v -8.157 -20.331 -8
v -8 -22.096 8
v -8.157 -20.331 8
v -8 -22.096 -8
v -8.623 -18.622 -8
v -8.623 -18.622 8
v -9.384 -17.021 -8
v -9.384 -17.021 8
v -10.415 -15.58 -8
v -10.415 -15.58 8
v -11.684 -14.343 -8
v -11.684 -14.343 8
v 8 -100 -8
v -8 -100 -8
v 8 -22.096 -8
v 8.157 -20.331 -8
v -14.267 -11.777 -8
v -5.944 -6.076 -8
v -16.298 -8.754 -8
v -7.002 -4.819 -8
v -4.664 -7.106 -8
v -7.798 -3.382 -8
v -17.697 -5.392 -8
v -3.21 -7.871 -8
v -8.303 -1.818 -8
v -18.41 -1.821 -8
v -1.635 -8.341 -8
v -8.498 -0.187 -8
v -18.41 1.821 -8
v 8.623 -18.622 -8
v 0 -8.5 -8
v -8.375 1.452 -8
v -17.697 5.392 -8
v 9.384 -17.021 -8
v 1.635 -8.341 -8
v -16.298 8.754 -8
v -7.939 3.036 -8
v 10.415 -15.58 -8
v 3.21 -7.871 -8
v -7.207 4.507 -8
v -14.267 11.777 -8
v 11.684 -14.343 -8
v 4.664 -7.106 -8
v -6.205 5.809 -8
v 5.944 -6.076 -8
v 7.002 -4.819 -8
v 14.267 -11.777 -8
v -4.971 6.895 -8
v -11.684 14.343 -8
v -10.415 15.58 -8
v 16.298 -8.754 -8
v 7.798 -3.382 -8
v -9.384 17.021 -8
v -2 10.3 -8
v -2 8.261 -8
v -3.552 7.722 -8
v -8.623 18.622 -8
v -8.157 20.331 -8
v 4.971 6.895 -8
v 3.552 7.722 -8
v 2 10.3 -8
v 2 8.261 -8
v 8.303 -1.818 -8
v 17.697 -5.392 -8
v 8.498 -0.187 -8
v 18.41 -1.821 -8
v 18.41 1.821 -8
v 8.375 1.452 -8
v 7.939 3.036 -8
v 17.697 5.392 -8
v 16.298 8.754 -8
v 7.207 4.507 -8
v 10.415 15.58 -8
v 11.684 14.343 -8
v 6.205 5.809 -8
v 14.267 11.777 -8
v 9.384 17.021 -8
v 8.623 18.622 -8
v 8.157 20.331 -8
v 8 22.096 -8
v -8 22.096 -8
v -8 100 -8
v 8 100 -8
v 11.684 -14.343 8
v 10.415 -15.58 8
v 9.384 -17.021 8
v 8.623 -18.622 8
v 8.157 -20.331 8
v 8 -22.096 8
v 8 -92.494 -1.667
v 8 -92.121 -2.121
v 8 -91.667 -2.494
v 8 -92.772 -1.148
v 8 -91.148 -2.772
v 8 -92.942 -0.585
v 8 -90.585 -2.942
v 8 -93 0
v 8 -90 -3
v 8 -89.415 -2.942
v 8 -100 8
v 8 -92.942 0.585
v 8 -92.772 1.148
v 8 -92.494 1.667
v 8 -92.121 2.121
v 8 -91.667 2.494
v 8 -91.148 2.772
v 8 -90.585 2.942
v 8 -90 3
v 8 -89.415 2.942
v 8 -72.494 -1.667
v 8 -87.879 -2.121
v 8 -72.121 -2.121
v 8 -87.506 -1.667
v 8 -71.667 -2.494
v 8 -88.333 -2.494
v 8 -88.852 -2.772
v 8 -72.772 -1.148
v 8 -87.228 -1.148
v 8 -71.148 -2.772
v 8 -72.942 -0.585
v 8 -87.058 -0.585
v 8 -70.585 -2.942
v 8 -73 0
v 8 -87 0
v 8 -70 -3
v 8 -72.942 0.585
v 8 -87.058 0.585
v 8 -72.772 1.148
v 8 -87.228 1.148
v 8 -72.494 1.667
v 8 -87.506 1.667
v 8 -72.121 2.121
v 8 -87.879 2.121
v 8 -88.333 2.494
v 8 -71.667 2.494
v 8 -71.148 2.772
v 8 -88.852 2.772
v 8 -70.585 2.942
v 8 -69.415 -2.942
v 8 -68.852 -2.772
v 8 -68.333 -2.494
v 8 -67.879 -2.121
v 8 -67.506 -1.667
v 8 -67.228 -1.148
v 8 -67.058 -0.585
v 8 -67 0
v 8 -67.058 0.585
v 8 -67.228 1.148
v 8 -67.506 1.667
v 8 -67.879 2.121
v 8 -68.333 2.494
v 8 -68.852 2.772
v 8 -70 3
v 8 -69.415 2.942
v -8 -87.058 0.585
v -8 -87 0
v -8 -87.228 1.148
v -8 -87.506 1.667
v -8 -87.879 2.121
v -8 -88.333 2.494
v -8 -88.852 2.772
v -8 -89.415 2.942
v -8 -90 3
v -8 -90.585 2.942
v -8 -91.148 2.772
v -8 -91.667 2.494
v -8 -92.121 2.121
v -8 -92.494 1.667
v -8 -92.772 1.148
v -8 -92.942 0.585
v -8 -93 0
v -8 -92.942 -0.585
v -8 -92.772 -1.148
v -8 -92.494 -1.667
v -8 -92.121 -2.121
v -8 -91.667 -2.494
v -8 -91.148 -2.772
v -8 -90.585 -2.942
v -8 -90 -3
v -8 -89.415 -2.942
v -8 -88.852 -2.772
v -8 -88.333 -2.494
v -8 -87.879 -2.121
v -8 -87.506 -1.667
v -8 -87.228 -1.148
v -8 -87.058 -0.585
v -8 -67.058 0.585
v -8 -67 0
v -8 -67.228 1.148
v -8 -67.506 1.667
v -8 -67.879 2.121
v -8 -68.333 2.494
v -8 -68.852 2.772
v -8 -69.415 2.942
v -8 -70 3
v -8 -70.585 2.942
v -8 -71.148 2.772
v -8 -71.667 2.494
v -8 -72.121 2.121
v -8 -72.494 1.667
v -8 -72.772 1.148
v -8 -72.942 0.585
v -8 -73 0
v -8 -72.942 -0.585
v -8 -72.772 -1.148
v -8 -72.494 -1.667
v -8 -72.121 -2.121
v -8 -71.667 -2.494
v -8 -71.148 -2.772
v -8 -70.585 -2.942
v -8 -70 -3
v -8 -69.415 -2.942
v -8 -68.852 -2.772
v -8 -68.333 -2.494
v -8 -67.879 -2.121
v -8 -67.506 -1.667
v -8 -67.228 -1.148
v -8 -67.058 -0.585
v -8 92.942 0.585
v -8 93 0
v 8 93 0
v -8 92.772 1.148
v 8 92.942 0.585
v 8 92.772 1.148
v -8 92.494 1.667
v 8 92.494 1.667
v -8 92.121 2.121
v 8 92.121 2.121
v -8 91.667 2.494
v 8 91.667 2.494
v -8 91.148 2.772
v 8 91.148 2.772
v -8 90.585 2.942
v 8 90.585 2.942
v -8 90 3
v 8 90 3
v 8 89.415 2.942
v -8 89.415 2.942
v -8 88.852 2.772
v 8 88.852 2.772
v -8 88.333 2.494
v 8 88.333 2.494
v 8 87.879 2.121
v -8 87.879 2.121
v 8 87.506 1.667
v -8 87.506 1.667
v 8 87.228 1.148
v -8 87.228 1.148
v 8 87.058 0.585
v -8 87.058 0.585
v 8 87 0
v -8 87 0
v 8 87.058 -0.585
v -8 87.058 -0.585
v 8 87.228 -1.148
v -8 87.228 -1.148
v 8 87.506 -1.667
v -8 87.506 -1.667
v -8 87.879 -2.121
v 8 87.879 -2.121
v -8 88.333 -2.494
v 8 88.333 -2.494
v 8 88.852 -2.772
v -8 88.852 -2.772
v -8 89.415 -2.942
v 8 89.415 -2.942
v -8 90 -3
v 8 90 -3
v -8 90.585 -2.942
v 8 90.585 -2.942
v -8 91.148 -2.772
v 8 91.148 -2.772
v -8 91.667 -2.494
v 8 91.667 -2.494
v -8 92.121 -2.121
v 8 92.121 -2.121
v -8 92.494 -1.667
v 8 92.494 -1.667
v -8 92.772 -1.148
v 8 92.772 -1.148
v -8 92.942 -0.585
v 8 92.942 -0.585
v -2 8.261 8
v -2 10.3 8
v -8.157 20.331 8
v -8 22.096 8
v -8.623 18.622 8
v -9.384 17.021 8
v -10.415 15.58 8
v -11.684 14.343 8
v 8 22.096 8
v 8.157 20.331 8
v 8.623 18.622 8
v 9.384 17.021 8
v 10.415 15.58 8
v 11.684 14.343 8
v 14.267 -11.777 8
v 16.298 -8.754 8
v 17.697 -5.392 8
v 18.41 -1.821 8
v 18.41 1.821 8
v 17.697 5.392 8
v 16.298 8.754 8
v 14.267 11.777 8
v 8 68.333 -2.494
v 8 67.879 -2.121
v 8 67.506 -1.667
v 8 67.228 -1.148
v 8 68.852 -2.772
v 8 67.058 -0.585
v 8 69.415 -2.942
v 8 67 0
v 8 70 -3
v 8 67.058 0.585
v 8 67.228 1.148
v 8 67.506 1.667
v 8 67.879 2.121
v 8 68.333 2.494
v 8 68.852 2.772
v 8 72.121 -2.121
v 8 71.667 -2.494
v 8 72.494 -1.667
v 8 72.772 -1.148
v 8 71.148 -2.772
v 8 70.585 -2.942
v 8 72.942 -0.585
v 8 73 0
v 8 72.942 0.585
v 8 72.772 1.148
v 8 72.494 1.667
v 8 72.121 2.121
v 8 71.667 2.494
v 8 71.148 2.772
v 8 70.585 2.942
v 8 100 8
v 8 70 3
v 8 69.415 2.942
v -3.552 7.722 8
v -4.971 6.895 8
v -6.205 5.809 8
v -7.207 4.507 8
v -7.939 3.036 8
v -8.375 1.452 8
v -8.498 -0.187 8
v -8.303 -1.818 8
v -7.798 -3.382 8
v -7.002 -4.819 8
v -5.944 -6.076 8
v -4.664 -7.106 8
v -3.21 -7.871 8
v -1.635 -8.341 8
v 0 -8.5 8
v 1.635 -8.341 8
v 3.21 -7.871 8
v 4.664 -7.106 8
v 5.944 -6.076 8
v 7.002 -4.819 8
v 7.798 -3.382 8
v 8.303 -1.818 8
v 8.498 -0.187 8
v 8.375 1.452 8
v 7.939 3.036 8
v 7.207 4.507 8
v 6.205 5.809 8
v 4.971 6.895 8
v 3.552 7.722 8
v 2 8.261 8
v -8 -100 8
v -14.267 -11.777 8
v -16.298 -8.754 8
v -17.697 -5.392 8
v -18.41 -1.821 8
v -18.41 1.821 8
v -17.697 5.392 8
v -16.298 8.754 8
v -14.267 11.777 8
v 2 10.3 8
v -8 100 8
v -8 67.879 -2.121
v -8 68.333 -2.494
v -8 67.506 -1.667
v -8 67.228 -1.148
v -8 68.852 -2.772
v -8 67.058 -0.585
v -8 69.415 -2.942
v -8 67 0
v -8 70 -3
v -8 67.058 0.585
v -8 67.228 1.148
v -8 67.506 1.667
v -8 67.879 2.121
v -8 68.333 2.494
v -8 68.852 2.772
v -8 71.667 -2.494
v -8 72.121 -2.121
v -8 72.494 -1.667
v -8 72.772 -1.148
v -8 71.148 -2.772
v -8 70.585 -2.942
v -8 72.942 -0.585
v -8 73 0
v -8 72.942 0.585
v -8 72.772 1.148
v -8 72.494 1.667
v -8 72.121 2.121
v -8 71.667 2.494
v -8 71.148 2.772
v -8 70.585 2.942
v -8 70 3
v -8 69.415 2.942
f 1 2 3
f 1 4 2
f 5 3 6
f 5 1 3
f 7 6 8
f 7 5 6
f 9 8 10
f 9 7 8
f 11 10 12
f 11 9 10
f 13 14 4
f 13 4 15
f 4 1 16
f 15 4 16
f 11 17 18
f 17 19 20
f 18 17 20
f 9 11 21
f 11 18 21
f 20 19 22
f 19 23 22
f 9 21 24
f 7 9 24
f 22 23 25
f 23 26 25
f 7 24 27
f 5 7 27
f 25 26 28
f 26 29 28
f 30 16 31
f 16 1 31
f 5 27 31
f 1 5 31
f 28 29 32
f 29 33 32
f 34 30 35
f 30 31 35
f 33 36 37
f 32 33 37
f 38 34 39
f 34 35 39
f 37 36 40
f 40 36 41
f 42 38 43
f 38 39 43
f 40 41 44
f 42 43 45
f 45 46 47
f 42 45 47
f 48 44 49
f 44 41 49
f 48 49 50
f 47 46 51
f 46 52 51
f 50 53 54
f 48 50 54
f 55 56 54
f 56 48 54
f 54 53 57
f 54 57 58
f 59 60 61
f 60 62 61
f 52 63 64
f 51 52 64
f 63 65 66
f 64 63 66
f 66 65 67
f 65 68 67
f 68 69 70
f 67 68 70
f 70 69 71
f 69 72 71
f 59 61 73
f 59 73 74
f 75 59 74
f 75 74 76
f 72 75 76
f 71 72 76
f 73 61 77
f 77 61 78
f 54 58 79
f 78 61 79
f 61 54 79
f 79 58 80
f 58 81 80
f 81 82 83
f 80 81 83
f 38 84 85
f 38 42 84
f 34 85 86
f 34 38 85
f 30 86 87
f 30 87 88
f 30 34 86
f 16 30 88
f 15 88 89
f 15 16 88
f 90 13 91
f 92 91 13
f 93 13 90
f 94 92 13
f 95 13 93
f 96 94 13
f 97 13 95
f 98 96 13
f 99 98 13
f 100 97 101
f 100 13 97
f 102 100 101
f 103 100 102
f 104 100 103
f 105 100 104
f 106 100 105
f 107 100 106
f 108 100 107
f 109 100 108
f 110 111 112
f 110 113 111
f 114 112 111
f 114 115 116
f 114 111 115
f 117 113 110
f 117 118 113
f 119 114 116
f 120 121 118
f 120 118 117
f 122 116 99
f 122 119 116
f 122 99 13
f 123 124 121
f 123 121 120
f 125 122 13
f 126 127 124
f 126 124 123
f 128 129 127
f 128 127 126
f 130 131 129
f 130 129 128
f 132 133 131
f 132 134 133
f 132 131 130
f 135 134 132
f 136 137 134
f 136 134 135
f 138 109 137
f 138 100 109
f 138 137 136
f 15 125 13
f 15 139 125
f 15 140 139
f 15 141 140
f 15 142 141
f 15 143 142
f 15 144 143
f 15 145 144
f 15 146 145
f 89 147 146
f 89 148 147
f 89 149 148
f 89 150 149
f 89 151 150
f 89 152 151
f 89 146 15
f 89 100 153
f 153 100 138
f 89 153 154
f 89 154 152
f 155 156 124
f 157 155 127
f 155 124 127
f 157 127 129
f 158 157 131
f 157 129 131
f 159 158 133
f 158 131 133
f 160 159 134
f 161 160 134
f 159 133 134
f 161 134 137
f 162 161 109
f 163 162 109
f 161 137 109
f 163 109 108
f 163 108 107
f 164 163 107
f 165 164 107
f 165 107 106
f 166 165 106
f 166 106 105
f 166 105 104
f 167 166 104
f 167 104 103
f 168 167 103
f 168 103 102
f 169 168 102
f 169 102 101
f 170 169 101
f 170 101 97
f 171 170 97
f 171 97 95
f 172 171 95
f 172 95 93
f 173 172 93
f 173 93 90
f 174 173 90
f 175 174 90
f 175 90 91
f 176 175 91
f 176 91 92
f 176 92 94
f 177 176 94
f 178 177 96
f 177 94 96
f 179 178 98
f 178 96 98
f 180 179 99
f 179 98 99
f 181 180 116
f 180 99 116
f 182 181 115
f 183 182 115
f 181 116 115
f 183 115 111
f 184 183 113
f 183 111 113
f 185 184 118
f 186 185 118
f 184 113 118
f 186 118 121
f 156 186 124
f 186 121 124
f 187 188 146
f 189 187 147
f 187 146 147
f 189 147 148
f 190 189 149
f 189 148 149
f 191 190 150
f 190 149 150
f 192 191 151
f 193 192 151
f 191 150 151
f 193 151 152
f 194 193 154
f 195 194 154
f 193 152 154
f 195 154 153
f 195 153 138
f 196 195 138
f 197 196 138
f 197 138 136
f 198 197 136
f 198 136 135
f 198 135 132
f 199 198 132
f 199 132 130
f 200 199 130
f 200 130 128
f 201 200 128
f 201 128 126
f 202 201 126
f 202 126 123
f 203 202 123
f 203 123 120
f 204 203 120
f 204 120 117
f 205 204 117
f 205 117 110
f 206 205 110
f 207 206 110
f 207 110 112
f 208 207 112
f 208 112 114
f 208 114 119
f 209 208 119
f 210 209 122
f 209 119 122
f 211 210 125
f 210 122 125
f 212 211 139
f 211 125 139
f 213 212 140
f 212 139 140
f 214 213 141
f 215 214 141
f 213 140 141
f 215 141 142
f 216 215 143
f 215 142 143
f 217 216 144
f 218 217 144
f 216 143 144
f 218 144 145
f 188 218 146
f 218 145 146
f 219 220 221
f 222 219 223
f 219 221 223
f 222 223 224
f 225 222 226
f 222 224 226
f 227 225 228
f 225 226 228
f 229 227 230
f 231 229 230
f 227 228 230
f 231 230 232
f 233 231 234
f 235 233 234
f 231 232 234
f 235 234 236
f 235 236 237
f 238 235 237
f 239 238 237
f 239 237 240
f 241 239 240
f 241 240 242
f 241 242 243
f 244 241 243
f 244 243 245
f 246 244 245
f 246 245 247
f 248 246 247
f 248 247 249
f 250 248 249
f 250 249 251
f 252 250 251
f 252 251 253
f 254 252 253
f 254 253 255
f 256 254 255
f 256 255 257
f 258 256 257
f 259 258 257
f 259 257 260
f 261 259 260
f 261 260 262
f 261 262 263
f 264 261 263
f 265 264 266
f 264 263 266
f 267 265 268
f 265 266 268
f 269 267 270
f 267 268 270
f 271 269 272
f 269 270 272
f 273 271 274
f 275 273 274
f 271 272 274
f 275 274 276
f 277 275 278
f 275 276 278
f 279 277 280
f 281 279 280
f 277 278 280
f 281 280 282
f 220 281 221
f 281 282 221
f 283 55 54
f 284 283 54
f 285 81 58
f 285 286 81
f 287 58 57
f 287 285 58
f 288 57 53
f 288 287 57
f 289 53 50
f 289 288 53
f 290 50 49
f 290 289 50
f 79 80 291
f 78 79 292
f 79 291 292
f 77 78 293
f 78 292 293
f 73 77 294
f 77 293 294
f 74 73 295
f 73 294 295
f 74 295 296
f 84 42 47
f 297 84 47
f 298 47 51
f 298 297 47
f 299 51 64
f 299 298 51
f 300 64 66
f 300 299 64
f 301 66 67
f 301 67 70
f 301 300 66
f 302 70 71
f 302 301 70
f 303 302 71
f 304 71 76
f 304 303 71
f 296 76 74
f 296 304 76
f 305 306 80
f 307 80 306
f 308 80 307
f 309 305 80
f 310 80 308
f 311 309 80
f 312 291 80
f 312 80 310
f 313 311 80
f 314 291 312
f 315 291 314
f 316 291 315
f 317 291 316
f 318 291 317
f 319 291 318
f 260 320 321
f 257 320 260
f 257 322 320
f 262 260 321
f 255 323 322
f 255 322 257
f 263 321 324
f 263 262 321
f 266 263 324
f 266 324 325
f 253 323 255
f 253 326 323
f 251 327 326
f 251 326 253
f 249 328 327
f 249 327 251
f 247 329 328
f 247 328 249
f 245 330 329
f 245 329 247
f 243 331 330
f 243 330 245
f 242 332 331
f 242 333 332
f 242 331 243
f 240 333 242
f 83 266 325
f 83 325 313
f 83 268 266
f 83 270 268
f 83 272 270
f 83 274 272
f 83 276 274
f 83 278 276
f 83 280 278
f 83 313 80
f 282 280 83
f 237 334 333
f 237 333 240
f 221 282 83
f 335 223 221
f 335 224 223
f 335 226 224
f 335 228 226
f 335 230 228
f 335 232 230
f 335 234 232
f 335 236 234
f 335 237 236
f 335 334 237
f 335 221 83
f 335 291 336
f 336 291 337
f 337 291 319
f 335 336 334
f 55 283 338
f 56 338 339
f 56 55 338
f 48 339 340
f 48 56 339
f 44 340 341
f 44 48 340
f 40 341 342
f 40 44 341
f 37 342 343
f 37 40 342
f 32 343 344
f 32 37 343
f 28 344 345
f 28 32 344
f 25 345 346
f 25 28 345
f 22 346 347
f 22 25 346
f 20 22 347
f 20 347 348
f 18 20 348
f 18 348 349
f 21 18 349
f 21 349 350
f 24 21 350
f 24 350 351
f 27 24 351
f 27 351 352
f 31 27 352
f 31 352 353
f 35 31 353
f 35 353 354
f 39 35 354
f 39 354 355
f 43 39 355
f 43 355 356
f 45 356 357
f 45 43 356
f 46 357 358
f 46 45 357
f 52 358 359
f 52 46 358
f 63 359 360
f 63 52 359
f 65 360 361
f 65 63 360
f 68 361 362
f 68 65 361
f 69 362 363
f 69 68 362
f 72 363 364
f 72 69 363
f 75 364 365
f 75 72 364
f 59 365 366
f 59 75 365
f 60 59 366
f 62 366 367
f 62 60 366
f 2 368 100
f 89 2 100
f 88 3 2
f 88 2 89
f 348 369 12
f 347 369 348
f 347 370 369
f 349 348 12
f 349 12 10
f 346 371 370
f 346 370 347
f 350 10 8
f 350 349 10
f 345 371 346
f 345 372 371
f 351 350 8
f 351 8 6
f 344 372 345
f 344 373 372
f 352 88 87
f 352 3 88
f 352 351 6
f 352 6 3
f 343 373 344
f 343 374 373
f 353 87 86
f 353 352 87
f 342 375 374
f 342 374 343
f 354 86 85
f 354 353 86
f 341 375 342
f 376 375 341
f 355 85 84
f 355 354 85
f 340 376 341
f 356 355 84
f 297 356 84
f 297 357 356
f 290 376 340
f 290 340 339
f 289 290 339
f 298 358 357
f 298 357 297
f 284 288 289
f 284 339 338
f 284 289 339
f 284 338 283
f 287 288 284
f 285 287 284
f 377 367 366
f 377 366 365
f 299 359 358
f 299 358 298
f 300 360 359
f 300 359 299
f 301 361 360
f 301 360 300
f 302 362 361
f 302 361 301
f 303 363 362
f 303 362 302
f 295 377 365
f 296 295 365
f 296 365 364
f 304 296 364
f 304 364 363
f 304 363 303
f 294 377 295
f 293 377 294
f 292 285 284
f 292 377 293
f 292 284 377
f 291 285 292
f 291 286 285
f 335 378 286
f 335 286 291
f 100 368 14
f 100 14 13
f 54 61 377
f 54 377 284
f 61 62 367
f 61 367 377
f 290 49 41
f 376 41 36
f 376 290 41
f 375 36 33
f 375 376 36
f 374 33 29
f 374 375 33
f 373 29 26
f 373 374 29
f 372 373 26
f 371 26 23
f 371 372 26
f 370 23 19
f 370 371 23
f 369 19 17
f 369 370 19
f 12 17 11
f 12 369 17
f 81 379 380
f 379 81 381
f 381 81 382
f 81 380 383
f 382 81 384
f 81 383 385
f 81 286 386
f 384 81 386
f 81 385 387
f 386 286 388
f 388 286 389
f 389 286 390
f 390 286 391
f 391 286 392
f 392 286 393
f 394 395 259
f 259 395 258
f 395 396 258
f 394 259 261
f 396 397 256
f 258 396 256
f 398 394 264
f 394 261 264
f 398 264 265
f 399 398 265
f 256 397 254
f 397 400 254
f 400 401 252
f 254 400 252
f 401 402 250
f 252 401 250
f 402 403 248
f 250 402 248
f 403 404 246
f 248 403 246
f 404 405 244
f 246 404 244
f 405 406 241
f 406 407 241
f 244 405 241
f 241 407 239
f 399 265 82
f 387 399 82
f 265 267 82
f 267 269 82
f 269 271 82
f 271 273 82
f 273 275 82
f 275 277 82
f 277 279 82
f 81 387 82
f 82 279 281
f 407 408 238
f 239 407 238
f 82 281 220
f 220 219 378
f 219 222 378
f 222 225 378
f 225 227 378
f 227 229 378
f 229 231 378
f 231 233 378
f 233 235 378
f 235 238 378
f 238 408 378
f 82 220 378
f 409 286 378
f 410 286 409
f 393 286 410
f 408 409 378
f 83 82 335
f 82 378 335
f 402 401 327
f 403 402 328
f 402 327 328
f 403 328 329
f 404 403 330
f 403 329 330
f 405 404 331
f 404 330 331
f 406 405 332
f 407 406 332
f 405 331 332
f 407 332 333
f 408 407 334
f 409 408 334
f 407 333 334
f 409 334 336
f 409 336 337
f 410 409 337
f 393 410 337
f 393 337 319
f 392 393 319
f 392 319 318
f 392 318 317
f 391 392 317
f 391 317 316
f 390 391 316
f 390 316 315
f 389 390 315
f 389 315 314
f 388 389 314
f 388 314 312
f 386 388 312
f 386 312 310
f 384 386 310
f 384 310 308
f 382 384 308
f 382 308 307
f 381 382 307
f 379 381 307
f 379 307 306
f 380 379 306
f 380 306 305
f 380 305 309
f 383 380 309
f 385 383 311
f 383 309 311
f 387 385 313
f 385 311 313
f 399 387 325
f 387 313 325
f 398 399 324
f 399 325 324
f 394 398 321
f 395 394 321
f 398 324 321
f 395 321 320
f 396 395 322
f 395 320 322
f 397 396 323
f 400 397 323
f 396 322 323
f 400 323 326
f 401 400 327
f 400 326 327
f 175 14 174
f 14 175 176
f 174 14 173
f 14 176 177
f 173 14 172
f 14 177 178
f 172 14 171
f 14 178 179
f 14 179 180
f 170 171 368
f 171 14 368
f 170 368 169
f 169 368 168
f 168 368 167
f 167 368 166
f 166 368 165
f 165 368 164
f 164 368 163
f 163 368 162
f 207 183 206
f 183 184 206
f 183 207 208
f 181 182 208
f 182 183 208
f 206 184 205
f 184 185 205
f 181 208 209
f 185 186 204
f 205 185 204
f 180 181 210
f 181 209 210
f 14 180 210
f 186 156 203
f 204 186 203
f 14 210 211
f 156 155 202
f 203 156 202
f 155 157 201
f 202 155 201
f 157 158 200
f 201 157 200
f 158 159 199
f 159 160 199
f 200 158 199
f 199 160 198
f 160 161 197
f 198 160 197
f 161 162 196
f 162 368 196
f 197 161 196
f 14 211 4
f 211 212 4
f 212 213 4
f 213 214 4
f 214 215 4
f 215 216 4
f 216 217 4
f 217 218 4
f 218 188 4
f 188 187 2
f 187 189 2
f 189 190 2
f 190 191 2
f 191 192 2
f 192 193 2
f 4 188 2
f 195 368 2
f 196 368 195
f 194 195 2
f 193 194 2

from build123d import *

# Parameters (mm, degrees)
SKETCH1_R           = 18.5
SKETCH1_R_2         = 8.5
BOSS_EXTRUDE1_DEPTH = 8
SKETCH2_W           = 16
SKETCH2_H           = 83.319172682
BOSS_EXTRUDE2_DEPTH = 8
SKETCH3_W           = 16
SKETCH3_H           = 83.319172682
BOSS_EXTRUDE3_DEPTH = 8
SKETCH4_W           = 4
SKETCH4_H           = 2.038644179
CUT_EXTRUDE3_DEPTH  = 103.947802308
FILLET1_R           = 10
SKETCH5_R           = 3
CUT_EXTRUDE4_DEPTH  = 104.760541633


with BuildPart() as part:
    # Sketch1 → Boss-Extrude1 (new, symmetric)
    with BuildSketch(Plane.XY):
        Circle(SKETCH1_R)
        Circle(SKETCH1_R_2, mode=Mode.SUBTRACT)
    extrude(amount=BOSS_EXTRUDE1_DEPTH, both=True)

    # Sketch2 → Boss-Extrude2 (add, symmetric)
    with BuildSketch(Plane.XY):
        with Locations((0, 58.340413659)):
            Rectangle(SKETCH2_W, SKETCH2_H)
    extrude(amount=BOSS_EXTRUDE2_DEPTH, both=True)

    # Sketch3 → Boss-Extrude3 (add, symmetric)
    with BuildSketch(Plane.XY):
        with Locations((0, -58.340413659)):
            Rectangle(SKETCH3_W, SKETCH3_H)
    extrude(amount=BOSS_EXTRUDE3_DEPTH, both=True)

    # Sketch4 → Cut-Extrude3 (cut, through all)
    with BuildSketch(Plane(origin=(0, 0, -8), x_dir=(-1, 0, 0), z_dir=(0, 0, -1))):
        with Locations((0, 9.28067791)):
            Rectangle(SKETCH4_W, SKETCH4_H)
    extrude(amount=-CUT_EXTRUDE3_DEPTH, mode=Mode.SUBTRACT)

    # Fillet1
    fillet1_edges = [part.edges().sort_by_distance(p)[0] for p in [
        (8, 16.680827318, 0),
        (-8, 16.680827318, 0),
        (8, -16.680827318, 0),
        (-8, -16.680827318, 0),
    ]]
    fillet(fillet1_edges, radius=FILLET1_R)

    # Sketch5 → Cut-Extrude4 (cut, through all)
    with BuildSketch(Plane(origin=(8, 0, 0), x_dir=(0, 0, -1), z_dir=(1, 0, 0))):
        with Locations(Location((0, 90, 0), (0, 0, 90))):
            Circle(SKETCH5_R)
        with Locations(Location((0, 70, 0), (0, 0, 90))):
            Circle(SKETCH5_R)
        with Locations(Location((0, -70, 0), (0, 0, 90))):
            Circle(SKETCH5_R)
        with Locations(Location((0, -90, 0), (0, 0, 90))):
            Circle(SKETCH5_R)
    extrude(amount=-CUT_EXTRUDE4_DEPTH, mode=Mode.SUBTRACT)


solid = part.part
